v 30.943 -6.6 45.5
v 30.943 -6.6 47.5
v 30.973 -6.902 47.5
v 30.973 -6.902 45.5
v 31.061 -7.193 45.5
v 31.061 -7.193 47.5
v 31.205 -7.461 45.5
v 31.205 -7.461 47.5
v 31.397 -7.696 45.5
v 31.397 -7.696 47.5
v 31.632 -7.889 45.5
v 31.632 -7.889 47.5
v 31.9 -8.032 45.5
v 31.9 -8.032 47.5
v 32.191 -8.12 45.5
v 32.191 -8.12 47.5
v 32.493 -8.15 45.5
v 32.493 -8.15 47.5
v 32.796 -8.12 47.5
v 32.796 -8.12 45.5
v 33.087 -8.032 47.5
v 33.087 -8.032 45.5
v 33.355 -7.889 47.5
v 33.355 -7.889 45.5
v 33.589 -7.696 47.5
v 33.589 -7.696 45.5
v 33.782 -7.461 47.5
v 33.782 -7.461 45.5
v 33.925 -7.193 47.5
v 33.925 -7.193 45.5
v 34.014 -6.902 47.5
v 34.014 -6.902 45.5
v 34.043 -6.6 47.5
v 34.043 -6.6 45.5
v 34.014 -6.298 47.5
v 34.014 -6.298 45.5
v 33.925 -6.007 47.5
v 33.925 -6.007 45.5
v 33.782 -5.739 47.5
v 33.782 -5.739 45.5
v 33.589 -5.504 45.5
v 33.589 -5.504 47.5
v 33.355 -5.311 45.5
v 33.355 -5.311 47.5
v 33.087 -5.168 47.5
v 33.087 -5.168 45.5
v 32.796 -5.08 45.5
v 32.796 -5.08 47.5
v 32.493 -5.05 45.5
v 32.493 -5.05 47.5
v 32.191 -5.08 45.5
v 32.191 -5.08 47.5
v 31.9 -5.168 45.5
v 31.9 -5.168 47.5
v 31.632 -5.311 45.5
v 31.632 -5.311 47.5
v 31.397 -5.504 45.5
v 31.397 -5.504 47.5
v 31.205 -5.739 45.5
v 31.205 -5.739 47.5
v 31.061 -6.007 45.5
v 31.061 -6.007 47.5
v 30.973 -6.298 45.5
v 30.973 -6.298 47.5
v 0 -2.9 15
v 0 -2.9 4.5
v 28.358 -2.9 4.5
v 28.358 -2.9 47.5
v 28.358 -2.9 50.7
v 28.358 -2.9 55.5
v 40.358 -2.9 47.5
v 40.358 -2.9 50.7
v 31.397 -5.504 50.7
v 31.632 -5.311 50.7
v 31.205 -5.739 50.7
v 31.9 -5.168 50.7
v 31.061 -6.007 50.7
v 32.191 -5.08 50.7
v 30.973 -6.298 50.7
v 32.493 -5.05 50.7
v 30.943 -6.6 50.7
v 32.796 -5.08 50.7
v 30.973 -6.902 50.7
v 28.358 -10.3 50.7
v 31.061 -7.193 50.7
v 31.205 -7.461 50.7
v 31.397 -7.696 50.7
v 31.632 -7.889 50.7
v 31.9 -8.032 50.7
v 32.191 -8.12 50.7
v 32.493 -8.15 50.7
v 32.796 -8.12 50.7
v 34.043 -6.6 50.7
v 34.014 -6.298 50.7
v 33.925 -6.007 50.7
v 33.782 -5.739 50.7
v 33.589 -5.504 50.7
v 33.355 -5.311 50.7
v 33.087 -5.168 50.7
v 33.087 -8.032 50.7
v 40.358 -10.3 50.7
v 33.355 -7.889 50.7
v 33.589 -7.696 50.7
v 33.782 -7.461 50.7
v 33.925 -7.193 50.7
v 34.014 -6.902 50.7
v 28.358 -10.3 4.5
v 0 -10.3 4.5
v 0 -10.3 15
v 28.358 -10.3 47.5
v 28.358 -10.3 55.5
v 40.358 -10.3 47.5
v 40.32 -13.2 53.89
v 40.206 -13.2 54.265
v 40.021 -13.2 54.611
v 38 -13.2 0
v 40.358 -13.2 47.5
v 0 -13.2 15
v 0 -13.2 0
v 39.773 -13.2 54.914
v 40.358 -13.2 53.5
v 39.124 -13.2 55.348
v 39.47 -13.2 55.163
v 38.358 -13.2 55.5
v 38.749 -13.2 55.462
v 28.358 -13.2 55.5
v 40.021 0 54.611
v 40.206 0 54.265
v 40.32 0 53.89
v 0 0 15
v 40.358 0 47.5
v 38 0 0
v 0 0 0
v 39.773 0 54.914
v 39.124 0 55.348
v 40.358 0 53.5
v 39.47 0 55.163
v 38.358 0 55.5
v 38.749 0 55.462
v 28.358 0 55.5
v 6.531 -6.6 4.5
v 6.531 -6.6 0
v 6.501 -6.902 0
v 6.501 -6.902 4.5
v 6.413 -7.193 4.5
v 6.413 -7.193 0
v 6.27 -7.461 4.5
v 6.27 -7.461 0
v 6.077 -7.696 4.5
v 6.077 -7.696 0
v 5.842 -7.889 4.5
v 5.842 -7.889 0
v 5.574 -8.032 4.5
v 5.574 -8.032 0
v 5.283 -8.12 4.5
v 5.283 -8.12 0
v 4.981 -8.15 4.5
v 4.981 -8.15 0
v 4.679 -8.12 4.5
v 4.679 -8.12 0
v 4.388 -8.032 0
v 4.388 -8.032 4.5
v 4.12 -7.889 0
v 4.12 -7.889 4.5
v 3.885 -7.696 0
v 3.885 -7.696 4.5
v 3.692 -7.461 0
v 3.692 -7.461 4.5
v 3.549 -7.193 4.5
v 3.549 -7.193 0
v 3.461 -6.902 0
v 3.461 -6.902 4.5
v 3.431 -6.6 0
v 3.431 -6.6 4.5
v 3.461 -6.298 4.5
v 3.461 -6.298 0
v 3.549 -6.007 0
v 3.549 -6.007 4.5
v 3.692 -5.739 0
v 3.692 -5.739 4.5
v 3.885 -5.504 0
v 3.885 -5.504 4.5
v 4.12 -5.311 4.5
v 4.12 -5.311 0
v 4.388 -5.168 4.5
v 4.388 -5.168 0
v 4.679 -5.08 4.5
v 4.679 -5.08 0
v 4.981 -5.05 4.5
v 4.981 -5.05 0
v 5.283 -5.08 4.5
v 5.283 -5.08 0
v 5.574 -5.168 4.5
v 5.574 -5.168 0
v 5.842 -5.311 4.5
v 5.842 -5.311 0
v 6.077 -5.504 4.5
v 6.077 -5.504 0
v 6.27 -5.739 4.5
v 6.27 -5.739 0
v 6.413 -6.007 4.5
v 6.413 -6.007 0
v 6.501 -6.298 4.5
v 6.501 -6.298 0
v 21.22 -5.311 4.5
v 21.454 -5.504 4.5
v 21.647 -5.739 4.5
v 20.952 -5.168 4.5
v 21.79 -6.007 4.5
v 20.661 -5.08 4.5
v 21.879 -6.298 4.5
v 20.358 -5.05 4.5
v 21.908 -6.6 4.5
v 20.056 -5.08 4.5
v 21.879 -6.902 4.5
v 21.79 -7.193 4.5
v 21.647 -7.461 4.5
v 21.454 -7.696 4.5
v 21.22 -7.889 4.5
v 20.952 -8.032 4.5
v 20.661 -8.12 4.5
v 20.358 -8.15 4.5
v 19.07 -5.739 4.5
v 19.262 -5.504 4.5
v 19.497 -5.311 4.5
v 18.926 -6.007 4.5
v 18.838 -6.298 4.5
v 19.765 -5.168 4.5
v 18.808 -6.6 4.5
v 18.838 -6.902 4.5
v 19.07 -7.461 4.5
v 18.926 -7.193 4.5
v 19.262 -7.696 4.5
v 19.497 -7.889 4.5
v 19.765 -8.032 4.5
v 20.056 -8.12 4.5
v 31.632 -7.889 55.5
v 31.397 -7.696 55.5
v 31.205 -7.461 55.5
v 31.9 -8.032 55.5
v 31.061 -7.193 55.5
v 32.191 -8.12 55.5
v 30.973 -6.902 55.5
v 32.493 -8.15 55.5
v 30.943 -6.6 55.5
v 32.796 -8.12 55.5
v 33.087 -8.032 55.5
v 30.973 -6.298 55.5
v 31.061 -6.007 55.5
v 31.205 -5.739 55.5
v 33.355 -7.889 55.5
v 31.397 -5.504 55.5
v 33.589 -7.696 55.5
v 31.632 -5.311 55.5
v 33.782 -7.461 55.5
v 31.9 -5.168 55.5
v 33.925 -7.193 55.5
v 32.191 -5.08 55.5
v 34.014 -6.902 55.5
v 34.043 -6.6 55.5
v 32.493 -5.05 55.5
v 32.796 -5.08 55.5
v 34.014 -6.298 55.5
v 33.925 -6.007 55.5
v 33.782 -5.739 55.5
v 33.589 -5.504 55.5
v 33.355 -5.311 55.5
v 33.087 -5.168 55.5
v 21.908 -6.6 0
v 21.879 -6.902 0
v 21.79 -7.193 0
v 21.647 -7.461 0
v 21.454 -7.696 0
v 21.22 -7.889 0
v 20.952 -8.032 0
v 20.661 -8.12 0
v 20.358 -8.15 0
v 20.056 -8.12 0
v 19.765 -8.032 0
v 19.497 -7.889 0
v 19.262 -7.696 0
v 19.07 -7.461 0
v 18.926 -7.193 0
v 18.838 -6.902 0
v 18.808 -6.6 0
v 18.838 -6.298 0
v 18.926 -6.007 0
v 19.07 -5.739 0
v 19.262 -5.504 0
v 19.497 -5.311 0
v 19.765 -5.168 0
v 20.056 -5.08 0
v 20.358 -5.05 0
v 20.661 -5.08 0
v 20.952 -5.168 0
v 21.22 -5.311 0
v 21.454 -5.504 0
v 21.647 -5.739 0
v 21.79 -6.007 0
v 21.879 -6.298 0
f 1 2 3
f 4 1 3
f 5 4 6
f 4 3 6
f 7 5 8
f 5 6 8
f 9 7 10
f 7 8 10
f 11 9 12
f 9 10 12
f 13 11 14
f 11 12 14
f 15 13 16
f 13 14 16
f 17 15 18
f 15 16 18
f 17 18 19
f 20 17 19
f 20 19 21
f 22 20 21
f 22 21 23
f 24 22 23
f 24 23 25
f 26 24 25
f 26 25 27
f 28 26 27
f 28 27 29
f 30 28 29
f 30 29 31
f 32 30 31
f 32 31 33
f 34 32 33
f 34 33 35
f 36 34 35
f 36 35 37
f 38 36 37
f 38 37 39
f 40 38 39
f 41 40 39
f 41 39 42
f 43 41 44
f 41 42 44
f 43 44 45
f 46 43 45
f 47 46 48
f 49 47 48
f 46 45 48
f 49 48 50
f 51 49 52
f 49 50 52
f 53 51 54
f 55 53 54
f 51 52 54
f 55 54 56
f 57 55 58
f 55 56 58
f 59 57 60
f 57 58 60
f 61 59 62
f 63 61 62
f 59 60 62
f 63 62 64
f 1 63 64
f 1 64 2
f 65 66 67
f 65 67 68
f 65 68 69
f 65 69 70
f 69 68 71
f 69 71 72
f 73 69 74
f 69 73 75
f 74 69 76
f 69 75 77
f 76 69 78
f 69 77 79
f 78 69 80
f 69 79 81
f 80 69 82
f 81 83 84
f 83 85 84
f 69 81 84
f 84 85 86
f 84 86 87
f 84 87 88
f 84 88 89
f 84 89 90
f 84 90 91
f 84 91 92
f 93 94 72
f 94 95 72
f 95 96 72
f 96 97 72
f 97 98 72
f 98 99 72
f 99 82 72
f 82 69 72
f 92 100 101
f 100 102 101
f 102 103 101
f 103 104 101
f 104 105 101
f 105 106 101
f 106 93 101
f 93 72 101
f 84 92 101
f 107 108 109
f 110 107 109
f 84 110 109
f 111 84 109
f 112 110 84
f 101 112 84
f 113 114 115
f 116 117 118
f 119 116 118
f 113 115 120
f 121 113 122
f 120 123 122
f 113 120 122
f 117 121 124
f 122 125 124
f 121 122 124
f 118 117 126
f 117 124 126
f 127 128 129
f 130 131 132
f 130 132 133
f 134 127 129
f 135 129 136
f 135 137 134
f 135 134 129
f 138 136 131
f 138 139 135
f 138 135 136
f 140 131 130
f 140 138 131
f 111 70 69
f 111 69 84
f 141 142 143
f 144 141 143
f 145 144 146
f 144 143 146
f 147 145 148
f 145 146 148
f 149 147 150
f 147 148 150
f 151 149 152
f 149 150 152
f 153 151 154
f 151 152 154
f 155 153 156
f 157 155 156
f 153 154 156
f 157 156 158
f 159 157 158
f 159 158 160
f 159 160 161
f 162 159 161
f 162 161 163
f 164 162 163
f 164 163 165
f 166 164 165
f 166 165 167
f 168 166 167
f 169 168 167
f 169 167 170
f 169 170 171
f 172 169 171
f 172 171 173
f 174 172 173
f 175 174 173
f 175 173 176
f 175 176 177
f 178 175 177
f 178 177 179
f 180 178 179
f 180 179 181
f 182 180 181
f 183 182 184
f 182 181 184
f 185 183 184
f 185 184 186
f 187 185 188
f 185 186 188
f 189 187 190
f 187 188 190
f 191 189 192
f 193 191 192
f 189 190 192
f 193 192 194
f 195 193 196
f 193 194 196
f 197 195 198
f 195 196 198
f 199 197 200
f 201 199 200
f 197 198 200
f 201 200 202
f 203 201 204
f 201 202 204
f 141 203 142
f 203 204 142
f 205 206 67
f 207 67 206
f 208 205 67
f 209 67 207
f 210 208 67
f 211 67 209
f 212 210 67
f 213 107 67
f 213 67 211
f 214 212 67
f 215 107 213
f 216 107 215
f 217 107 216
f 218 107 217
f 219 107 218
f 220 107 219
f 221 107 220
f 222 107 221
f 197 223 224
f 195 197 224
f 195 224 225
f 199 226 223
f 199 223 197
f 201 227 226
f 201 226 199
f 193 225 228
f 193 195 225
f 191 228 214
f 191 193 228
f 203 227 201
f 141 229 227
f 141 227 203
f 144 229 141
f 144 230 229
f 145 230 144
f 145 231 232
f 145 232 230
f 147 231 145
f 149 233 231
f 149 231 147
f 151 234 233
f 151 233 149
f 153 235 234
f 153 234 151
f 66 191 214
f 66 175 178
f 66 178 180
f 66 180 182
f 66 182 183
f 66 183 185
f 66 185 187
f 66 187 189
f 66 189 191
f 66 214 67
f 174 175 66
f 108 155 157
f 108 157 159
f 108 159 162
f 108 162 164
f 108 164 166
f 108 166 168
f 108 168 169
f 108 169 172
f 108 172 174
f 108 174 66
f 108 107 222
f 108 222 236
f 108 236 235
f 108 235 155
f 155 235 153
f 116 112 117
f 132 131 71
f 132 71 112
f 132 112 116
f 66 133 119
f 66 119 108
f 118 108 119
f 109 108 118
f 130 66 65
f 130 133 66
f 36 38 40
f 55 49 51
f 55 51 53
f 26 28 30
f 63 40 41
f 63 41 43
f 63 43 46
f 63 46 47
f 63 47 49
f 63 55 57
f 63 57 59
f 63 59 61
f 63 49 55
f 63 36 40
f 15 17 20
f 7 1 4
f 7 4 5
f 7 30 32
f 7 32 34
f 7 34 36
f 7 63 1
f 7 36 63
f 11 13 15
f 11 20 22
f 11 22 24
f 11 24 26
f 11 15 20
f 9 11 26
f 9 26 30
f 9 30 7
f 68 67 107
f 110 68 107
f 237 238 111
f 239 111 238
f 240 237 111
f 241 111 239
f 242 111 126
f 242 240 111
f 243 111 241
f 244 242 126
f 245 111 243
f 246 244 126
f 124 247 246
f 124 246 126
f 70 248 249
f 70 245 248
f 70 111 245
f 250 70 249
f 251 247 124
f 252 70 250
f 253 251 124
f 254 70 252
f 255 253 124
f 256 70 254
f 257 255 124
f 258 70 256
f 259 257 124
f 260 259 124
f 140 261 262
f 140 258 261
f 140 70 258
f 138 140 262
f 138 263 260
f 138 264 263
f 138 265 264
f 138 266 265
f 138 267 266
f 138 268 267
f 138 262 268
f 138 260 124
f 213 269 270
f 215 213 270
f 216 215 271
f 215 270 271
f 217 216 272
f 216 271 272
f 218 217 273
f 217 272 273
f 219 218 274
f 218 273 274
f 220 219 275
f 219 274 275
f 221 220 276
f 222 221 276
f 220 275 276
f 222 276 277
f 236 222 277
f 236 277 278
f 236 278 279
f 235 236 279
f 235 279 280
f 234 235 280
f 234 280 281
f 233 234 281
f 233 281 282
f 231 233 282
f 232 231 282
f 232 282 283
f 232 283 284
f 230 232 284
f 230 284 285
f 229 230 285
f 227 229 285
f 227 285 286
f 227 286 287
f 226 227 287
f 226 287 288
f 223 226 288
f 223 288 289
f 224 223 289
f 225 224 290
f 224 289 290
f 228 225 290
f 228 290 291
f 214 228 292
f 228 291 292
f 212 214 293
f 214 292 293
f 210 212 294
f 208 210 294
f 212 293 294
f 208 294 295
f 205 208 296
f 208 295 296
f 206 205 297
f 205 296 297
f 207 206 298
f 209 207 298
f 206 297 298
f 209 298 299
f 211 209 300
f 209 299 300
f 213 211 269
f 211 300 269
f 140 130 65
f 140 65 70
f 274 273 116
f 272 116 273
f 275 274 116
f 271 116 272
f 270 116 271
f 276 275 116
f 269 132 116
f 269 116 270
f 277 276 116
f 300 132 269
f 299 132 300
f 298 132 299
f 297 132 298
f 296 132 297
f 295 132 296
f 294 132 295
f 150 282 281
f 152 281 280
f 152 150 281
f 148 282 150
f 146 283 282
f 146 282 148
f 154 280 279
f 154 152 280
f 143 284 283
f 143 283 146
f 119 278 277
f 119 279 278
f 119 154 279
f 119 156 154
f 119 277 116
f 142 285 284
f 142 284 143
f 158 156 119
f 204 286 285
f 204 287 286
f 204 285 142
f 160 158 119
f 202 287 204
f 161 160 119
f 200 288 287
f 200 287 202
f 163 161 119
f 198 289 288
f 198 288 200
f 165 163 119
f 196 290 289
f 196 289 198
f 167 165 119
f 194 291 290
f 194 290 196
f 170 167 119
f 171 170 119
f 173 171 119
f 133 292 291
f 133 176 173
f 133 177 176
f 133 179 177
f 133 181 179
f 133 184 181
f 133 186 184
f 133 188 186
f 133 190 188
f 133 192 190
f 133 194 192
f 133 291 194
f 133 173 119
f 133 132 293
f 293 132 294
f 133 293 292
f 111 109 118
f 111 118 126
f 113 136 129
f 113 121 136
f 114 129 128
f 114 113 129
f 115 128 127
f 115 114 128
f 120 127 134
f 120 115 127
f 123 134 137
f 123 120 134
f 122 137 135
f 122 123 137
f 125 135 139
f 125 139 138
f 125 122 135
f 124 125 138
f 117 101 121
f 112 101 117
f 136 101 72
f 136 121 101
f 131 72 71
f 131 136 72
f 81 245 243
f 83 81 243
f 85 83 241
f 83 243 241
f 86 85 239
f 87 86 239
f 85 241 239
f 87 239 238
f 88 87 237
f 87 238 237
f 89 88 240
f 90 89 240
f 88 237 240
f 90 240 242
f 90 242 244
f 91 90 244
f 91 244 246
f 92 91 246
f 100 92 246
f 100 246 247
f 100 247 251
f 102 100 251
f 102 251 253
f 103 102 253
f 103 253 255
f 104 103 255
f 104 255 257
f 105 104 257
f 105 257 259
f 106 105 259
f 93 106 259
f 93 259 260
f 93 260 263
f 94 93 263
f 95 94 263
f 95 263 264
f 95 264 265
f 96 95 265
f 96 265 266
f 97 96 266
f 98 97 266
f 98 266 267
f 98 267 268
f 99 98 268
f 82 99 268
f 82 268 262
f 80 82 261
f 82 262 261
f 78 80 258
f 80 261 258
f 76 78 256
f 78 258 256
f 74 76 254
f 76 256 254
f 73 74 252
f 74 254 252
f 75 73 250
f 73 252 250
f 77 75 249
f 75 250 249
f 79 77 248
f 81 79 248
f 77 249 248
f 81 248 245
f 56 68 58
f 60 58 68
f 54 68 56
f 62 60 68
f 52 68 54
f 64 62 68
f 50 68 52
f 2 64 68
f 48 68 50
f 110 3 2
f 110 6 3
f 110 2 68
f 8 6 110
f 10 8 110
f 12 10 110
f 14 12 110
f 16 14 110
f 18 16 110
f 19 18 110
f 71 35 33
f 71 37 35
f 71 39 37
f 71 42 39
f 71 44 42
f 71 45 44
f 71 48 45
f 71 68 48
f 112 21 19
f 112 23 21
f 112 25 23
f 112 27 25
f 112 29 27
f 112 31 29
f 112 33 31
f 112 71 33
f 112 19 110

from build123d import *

# Parameters (mm, degrees)
PAD034_DEPTH    = 13.2
SKETCH109_R     = 1.55
POCKET067_DEPTH = 80
SKETCH110_W     = 28.3584052975
SKETCH110_H     = 7.4
POCKET068_DEPTH = 51
SKETCH112_R     = 1.55
POCKET069_DEPTH = 10
FILLET_R        = 2
SKETCH113_W     = 3.2
SKETCH113_H     = 7.4
POCKET070_DEPTH = 12


with BuildPart() as part:
    # Sketch108 → Pad034 (new body)
    with BuildSketch(Plane.XZ):
        Polygon((40.3584052975, 55.5), (40.3584052975, 47.5), (38, 0), (0, 0), (0, 15), (28.3584052975, 55.5), align=None)
    extrude(amount=PAD034_DEPTH)

    # Sketch109 (on Face3 of Pad034) → Pocket067 (cut)
    with BuildSketch(Plane(origin=(0, 0, 0), x_dir=(1, 0, 0), z_dir=(0, 0, -1))):
        with Locations((4.9809052975, 6.6)):
            Circle(SKETCH109_R)
        with Locations((20.3584052975, 6.6)):
            Circle(SKETCH109_R)
    extrude(amount=-POCKET067_DEPTH, mode=Mode.SUBTRACT)

    # Sketch110 (on Face2 of Pocket067) → Pocket068 (cut)
    with BuildSketch(Plane(origin=(0, 0, 55.5), x_dir=(-1, 0, 0), z_dir=(0, 0, 1))):
        with Locations((-14.1792026487, 6.6)):
            Rectangle(SKETCH110_W, SKETCH110_H)
    extrude(amount=-POCKET068_DEPTH, mode=Mode.SUBTRACT)

    # Sketch112 (on Face2 of Pocket068) → Pocket069 (cut)
    with BuildSketch(Plane(origin=(0, 0, 55.5), x_dir=(-1, 0, 0), z_dir=(0, 0, 1))):
        with Locations((-32.4934052975, 6.6)):
            Circle(SKETCH112_R)
    extrude(amount=-POCKET069_DEPTH, mode=Mode.SUBTRACT)

    # Fillet
    fillet_edges = [part.edges().sort_by_distance(p)[0] for p in [
        (40.358405, -6.6, 55.5),
    ]]
    fillet(fillet_edges, radius=FILLET_R)

    # Sketch113 (on Face1 of Fillet) → Pocket070 (cut)
    with BuildSketch(Plane(origin=(40.3584052975, 0, 0), x_dir=(0, 0, 1), z_dir=(1, 0, 0))):
        with Locations((49.1, 6.6)):
            Rectangle(SKETCH113_W, SKETCH113_H)
    extrude(amount=-POCKET070_DEPTH, mode=Mode.SUBTRACT)


solid = part.part
